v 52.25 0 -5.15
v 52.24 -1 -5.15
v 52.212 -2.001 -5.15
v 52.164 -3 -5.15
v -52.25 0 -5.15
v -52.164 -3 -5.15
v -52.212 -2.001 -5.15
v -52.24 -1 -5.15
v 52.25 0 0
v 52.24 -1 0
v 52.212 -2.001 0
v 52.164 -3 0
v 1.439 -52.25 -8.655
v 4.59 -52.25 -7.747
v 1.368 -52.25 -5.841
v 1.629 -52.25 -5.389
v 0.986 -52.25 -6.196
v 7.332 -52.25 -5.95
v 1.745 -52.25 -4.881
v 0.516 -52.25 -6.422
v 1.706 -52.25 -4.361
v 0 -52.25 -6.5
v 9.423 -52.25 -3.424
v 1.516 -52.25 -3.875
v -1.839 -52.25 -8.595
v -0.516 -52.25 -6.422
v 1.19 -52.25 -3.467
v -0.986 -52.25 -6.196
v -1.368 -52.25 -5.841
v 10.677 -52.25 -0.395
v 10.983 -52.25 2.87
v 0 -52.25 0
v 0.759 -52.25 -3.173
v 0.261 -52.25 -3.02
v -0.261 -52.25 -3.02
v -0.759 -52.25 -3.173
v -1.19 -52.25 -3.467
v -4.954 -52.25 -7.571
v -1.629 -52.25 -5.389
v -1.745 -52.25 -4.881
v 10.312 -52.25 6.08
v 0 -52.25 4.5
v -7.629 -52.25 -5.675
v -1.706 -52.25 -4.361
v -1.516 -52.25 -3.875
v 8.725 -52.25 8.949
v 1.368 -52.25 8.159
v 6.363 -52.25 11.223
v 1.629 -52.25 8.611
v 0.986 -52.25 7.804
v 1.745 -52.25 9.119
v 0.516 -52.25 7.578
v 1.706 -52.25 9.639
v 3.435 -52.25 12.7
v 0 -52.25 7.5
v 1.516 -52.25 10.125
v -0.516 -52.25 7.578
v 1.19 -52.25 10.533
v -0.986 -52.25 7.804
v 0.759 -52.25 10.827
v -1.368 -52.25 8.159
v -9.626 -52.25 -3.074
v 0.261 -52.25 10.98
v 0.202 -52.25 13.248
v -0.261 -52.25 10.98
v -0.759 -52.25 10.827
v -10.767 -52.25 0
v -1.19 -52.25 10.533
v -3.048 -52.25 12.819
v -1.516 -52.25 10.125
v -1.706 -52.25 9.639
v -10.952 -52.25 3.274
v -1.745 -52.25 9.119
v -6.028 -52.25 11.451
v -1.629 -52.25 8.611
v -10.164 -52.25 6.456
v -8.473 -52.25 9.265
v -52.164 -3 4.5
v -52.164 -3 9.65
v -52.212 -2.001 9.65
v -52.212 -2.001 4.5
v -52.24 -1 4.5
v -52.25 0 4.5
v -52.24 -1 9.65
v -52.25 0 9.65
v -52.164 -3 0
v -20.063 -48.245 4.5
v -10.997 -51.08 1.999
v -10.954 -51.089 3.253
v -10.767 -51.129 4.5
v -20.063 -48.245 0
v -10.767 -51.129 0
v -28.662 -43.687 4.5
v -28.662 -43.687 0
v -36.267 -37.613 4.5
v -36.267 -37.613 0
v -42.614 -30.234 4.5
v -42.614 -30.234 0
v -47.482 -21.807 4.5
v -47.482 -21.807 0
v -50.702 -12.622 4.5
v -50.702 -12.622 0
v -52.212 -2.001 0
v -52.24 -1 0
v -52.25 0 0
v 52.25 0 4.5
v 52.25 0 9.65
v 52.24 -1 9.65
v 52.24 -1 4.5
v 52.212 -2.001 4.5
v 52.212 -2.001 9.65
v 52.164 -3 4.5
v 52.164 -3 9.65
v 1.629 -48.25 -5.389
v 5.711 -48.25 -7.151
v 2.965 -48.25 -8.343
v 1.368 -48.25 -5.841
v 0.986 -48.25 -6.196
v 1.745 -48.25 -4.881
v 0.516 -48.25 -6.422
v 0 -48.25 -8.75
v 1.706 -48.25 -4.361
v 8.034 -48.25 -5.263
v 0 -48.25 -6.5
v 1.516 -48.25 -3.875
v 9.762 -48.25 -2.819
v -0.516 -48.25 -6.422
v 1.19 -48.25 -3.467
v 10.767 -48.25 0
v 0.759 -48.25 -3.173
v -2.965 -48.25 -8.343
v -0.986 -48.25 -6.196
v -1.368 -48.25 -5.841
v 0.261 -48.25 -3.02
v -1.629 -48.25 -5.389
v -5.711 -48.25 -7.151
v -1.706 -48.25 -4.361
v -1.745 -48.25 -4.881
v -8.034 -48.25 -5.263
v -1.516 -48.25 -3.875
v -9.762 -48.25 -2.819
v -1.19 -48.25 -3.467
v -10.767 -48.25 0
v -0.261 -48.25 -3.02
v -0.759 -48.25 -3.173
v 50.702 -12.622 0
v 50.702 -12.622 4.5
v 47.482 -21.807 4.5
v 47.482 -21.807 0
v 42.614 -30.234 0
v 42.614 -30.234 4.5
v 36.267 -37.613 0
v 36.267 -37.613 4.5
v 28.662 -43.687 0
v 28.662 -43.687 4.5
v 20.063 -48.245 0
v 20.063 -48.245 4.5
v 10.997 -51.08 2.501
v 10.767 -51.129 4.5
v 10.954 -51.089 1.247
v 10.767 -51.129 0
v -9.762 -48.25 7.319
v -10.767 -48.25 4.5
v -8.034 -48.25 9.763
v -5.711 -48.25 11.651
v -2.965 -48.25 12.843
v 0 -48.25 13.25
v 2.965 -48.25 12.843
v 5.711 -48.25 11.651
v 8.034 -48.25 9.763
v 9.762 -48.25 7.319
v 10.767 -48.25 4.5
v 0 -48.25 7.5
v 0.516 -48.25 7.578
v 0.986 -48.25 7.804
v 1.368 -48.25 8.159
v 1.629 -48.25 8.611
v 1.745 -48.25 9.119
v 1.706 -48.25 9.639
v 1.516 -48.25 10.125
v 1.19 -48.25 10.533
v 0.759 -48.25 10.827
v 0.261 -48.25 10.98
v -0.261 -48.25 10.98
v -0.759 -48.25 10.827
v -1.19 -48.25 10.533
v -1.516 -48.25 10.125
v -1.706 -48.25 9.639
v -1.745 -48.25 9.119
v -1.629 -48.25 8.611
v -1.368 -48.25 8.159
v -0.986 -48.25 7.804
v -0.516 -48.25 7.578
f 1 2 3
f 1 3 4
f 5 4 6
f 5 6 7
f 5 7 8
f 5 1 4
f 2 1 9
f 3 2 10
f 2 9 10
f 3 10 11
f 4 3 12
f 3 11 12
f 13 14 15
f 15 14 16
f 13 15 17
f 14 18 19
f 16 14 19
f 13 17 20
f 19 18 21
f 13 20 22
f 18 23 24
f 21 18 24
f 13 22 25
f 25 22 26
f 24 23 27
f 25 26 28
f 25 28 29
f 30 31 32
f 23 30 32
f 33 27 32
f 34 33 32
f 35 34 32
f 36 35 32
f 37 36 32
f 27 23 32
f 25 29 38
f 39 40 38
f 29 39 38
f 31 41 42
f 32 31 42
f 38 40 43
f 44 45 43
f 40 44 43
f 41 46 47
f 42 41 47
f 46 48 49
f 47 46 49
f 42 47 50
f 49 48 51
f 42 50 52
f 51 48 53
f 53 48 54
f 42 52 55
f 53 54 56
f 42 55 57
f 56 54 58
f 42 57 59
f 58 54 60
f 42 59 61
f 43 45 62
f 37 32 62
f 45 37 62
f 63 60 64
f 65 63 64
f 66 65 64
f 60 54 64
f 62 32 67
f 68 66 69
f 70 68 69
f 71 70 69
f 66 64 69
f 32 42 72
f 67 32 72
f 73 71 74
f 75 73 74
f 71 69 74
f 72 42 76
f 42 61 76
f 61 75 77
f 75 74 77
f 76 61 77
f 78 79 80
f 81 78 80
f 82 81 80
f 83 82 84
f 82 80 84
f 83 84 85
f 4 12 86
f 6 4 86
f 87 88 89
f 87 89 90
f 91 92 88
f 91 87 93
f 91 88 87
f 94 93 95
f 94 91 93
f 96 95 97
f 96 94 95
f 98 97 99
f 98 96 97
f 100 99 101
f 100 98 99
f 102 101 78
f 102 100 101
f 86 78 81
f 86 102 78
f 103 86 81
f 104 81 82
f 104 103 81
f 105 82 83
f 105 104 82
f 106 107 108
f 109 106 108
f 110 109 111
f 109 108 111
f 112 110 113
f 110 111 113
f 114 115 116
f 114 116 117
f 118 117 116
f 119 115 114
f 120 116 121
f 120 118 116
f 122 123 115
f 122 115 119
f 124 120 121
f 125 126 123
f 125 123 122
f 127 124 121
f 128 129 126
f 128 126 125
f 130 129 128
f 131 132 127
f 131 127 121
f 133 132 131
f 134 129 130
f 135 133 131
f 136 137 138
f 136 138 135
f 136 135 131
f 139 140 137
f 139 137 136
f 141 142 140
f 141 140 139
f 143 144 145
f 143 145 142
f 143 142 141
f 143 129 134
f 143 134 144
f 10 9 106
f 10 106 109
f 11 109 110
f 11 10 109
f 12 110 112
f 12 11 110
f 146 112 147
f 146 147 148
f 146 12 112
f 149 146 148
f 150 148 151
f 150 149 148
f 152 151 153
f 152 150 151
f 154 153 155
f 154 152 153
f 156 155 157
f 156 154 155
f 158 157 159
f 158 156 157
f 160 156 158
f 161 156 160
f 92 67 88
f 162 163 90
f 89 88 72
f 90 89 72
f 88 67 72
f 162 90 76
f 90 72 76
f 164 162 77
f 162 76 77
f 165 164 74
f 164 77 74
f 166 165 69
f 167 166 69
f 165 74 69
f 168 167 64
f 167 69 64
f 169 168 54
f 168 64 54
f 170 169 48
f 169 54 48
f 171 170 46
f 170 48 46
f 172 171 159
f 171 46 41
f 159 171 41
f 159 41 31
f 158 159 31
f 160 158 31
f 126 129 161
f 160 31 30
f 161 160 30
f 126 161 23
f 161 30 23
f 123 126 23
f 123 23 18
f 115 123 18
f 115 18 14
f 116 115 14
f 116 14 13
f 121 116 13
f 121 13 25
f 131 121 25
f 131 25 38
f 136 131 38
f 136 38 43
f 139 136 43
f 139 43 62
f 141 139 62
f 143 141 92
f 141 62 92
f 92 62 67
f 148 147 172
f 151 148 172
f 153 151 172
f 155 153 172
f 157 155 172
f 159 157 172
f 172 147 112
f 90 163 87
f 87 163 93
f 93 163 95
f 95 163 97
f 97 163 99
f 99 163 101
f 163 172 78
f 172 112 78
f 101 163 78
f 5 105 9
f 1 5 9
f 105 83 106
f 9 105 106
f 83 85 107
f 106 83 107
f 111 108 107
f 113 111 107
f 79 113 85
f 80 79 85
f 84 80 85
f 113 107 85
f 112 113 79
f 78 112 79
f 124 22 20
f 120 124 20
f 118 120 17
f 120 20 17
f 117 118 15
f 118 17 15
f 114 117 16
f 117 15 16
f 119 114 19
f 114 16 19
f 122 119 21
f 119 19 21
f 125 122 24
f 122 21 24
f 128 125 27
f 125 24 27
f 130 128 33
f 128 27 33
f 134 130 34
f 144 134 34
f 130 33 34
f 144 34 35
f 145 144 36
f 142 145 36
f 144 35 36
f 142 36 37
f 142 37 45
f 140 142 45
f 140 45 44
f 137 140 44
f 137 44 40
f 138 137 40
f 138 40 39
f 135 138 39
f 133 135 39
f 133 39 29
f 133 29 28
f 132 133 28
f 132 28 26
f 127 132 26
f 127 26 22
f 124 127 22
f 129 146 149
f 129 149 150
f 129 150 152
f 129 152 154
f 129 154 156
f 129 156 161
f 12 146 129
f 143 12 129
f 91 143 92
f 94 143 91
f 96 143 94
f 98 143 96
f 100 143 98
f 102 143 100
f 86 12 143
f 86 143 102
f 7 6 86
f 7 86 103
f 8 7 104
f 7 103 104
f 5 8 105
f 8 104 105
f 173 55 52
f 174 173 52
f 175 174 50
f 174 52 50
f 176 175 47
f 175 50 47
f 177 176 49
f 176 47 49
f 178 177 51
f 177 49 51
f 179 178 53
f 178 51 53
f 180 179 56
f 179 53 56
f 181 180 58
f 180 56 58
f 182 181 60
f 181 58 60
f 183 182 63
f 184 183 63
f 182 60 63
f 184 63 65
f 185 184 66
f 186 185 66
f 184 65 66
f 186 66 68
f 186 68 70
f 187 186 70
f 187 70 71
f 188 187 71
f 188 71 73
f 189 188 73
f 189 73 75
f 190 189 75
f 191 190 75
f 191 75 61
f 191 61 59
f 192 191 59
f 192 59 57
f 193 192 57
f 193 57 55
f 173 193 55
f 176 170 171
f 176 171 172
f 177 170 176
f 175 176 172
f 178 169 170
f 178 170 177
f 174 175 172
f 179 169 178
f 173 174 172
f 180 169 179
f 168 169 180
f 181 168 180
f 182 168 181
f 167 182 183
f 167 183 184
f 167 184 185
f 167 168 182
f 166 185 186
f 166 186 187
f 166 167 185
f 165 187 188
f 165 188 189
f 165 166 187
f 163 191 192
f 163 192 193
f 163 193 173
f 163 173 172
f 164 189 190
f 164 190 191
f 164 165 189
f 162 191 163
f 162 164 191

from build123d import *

# Parameters (mm, degrees)
EXTRUDE_1_DEPTH     = 4.5
EXTRUDE_2_DEPTH     = 7.4
SKETCH_3_R          = 11
EXTRUDE_3_DEPTH     = 4
CUT_EXTRUDE_2_REACH = 77.071
SKETCH_7_R          = 1.75


with BuildPart() as part:
    # 草图1 → 凸台-拉伸1 (new body)
    with BuildSketch(Plane.XY):
        with BuildLine():
            Line((-52.25, 0), (52.25, 0))
            ThreePointArc((52.25, 0), (0, -52.25), (-52.25, 0))
        make_face()
    extrude(amount=EXTRUDE_1_DEPTH)

    # 草图2 → 凸台-拉伸2 (add, symmetric)
    with BuildSketch(Plane.XY.offset(2.25)):
        with BuildLine():
            Line((-52.25, 0), (52.25, 0))
            ThreePointArc((52.25, 0), (52.22844668, -1.500619011), (52.163804501, -3))
            Line((52.163804501, -3), (-52.163804501, -3))
            ThreePointArc((-52.163804501, -3), (-52.22844668, -1.500619011), (-52.25, 0))
        make_face()
    extrude(amount=EXTRUDE_2_DEPTH, both=True)

    # 草图3 → 凸台-拉伸3 (add)
    with BuildSketch(Plane(origin=(0, -52.25, 0), x_dir=(1, 0, 0), z_dir=(0, 1, 0))):
        with Locations(Location((0, -2.25, 0), (0, 0, 168.19710831))):
            Circle(SKETCH_3_R)
    extrude(amount=EXTRUDE_3_DEPTH)

    # 草图7 → 切除-拉伸2 (cut, up to next)
    with BuildSketch(Plane.XZ.offset(52.25), mode=Mode.PRIVATE) as cut_extrude_2_sk1:
        with Locations(Location((0, 9.25, 0), (0, 0, 270))):
            Circle(SKETCH_7_R)
    cut_extrude_2_tool1 = extrude(cut_extrude_2_sk1.sketch, amount=-CUT_EXTRUDE_2_REACH, mode=Mode.PRIVATE) & part.part
    # 草图7 → 切除-拉伸2 (cut, up to next)
    with BuildSketch(Plane.XZ.offset(52.25), mode=Mode.PRIVATE) as cut_extrude_2_sk2:
        with Locations(Location((0, -4.75, 0), (0, 0, 270))):
            Circle(SKETCH_7_R)
    cut_extrude_2_tool2 = extrude(cut_extrude_2_sk2.sketch, amount=-CUT_EXTRUDE_2_REACH, mode=Mode.PRIVATE) & part.part
    add(cut_extrude_2_tool1.solids().sort_by_distance((0, -52.25, 9.25))[0], mode=Mode.SUBTRACT)
    add(cut_extrude_2_tool2.solids().sort_by_distance((0, -52.25, -4.75))[0], mode=Mode.SUBTRACT)


solid = part.part
